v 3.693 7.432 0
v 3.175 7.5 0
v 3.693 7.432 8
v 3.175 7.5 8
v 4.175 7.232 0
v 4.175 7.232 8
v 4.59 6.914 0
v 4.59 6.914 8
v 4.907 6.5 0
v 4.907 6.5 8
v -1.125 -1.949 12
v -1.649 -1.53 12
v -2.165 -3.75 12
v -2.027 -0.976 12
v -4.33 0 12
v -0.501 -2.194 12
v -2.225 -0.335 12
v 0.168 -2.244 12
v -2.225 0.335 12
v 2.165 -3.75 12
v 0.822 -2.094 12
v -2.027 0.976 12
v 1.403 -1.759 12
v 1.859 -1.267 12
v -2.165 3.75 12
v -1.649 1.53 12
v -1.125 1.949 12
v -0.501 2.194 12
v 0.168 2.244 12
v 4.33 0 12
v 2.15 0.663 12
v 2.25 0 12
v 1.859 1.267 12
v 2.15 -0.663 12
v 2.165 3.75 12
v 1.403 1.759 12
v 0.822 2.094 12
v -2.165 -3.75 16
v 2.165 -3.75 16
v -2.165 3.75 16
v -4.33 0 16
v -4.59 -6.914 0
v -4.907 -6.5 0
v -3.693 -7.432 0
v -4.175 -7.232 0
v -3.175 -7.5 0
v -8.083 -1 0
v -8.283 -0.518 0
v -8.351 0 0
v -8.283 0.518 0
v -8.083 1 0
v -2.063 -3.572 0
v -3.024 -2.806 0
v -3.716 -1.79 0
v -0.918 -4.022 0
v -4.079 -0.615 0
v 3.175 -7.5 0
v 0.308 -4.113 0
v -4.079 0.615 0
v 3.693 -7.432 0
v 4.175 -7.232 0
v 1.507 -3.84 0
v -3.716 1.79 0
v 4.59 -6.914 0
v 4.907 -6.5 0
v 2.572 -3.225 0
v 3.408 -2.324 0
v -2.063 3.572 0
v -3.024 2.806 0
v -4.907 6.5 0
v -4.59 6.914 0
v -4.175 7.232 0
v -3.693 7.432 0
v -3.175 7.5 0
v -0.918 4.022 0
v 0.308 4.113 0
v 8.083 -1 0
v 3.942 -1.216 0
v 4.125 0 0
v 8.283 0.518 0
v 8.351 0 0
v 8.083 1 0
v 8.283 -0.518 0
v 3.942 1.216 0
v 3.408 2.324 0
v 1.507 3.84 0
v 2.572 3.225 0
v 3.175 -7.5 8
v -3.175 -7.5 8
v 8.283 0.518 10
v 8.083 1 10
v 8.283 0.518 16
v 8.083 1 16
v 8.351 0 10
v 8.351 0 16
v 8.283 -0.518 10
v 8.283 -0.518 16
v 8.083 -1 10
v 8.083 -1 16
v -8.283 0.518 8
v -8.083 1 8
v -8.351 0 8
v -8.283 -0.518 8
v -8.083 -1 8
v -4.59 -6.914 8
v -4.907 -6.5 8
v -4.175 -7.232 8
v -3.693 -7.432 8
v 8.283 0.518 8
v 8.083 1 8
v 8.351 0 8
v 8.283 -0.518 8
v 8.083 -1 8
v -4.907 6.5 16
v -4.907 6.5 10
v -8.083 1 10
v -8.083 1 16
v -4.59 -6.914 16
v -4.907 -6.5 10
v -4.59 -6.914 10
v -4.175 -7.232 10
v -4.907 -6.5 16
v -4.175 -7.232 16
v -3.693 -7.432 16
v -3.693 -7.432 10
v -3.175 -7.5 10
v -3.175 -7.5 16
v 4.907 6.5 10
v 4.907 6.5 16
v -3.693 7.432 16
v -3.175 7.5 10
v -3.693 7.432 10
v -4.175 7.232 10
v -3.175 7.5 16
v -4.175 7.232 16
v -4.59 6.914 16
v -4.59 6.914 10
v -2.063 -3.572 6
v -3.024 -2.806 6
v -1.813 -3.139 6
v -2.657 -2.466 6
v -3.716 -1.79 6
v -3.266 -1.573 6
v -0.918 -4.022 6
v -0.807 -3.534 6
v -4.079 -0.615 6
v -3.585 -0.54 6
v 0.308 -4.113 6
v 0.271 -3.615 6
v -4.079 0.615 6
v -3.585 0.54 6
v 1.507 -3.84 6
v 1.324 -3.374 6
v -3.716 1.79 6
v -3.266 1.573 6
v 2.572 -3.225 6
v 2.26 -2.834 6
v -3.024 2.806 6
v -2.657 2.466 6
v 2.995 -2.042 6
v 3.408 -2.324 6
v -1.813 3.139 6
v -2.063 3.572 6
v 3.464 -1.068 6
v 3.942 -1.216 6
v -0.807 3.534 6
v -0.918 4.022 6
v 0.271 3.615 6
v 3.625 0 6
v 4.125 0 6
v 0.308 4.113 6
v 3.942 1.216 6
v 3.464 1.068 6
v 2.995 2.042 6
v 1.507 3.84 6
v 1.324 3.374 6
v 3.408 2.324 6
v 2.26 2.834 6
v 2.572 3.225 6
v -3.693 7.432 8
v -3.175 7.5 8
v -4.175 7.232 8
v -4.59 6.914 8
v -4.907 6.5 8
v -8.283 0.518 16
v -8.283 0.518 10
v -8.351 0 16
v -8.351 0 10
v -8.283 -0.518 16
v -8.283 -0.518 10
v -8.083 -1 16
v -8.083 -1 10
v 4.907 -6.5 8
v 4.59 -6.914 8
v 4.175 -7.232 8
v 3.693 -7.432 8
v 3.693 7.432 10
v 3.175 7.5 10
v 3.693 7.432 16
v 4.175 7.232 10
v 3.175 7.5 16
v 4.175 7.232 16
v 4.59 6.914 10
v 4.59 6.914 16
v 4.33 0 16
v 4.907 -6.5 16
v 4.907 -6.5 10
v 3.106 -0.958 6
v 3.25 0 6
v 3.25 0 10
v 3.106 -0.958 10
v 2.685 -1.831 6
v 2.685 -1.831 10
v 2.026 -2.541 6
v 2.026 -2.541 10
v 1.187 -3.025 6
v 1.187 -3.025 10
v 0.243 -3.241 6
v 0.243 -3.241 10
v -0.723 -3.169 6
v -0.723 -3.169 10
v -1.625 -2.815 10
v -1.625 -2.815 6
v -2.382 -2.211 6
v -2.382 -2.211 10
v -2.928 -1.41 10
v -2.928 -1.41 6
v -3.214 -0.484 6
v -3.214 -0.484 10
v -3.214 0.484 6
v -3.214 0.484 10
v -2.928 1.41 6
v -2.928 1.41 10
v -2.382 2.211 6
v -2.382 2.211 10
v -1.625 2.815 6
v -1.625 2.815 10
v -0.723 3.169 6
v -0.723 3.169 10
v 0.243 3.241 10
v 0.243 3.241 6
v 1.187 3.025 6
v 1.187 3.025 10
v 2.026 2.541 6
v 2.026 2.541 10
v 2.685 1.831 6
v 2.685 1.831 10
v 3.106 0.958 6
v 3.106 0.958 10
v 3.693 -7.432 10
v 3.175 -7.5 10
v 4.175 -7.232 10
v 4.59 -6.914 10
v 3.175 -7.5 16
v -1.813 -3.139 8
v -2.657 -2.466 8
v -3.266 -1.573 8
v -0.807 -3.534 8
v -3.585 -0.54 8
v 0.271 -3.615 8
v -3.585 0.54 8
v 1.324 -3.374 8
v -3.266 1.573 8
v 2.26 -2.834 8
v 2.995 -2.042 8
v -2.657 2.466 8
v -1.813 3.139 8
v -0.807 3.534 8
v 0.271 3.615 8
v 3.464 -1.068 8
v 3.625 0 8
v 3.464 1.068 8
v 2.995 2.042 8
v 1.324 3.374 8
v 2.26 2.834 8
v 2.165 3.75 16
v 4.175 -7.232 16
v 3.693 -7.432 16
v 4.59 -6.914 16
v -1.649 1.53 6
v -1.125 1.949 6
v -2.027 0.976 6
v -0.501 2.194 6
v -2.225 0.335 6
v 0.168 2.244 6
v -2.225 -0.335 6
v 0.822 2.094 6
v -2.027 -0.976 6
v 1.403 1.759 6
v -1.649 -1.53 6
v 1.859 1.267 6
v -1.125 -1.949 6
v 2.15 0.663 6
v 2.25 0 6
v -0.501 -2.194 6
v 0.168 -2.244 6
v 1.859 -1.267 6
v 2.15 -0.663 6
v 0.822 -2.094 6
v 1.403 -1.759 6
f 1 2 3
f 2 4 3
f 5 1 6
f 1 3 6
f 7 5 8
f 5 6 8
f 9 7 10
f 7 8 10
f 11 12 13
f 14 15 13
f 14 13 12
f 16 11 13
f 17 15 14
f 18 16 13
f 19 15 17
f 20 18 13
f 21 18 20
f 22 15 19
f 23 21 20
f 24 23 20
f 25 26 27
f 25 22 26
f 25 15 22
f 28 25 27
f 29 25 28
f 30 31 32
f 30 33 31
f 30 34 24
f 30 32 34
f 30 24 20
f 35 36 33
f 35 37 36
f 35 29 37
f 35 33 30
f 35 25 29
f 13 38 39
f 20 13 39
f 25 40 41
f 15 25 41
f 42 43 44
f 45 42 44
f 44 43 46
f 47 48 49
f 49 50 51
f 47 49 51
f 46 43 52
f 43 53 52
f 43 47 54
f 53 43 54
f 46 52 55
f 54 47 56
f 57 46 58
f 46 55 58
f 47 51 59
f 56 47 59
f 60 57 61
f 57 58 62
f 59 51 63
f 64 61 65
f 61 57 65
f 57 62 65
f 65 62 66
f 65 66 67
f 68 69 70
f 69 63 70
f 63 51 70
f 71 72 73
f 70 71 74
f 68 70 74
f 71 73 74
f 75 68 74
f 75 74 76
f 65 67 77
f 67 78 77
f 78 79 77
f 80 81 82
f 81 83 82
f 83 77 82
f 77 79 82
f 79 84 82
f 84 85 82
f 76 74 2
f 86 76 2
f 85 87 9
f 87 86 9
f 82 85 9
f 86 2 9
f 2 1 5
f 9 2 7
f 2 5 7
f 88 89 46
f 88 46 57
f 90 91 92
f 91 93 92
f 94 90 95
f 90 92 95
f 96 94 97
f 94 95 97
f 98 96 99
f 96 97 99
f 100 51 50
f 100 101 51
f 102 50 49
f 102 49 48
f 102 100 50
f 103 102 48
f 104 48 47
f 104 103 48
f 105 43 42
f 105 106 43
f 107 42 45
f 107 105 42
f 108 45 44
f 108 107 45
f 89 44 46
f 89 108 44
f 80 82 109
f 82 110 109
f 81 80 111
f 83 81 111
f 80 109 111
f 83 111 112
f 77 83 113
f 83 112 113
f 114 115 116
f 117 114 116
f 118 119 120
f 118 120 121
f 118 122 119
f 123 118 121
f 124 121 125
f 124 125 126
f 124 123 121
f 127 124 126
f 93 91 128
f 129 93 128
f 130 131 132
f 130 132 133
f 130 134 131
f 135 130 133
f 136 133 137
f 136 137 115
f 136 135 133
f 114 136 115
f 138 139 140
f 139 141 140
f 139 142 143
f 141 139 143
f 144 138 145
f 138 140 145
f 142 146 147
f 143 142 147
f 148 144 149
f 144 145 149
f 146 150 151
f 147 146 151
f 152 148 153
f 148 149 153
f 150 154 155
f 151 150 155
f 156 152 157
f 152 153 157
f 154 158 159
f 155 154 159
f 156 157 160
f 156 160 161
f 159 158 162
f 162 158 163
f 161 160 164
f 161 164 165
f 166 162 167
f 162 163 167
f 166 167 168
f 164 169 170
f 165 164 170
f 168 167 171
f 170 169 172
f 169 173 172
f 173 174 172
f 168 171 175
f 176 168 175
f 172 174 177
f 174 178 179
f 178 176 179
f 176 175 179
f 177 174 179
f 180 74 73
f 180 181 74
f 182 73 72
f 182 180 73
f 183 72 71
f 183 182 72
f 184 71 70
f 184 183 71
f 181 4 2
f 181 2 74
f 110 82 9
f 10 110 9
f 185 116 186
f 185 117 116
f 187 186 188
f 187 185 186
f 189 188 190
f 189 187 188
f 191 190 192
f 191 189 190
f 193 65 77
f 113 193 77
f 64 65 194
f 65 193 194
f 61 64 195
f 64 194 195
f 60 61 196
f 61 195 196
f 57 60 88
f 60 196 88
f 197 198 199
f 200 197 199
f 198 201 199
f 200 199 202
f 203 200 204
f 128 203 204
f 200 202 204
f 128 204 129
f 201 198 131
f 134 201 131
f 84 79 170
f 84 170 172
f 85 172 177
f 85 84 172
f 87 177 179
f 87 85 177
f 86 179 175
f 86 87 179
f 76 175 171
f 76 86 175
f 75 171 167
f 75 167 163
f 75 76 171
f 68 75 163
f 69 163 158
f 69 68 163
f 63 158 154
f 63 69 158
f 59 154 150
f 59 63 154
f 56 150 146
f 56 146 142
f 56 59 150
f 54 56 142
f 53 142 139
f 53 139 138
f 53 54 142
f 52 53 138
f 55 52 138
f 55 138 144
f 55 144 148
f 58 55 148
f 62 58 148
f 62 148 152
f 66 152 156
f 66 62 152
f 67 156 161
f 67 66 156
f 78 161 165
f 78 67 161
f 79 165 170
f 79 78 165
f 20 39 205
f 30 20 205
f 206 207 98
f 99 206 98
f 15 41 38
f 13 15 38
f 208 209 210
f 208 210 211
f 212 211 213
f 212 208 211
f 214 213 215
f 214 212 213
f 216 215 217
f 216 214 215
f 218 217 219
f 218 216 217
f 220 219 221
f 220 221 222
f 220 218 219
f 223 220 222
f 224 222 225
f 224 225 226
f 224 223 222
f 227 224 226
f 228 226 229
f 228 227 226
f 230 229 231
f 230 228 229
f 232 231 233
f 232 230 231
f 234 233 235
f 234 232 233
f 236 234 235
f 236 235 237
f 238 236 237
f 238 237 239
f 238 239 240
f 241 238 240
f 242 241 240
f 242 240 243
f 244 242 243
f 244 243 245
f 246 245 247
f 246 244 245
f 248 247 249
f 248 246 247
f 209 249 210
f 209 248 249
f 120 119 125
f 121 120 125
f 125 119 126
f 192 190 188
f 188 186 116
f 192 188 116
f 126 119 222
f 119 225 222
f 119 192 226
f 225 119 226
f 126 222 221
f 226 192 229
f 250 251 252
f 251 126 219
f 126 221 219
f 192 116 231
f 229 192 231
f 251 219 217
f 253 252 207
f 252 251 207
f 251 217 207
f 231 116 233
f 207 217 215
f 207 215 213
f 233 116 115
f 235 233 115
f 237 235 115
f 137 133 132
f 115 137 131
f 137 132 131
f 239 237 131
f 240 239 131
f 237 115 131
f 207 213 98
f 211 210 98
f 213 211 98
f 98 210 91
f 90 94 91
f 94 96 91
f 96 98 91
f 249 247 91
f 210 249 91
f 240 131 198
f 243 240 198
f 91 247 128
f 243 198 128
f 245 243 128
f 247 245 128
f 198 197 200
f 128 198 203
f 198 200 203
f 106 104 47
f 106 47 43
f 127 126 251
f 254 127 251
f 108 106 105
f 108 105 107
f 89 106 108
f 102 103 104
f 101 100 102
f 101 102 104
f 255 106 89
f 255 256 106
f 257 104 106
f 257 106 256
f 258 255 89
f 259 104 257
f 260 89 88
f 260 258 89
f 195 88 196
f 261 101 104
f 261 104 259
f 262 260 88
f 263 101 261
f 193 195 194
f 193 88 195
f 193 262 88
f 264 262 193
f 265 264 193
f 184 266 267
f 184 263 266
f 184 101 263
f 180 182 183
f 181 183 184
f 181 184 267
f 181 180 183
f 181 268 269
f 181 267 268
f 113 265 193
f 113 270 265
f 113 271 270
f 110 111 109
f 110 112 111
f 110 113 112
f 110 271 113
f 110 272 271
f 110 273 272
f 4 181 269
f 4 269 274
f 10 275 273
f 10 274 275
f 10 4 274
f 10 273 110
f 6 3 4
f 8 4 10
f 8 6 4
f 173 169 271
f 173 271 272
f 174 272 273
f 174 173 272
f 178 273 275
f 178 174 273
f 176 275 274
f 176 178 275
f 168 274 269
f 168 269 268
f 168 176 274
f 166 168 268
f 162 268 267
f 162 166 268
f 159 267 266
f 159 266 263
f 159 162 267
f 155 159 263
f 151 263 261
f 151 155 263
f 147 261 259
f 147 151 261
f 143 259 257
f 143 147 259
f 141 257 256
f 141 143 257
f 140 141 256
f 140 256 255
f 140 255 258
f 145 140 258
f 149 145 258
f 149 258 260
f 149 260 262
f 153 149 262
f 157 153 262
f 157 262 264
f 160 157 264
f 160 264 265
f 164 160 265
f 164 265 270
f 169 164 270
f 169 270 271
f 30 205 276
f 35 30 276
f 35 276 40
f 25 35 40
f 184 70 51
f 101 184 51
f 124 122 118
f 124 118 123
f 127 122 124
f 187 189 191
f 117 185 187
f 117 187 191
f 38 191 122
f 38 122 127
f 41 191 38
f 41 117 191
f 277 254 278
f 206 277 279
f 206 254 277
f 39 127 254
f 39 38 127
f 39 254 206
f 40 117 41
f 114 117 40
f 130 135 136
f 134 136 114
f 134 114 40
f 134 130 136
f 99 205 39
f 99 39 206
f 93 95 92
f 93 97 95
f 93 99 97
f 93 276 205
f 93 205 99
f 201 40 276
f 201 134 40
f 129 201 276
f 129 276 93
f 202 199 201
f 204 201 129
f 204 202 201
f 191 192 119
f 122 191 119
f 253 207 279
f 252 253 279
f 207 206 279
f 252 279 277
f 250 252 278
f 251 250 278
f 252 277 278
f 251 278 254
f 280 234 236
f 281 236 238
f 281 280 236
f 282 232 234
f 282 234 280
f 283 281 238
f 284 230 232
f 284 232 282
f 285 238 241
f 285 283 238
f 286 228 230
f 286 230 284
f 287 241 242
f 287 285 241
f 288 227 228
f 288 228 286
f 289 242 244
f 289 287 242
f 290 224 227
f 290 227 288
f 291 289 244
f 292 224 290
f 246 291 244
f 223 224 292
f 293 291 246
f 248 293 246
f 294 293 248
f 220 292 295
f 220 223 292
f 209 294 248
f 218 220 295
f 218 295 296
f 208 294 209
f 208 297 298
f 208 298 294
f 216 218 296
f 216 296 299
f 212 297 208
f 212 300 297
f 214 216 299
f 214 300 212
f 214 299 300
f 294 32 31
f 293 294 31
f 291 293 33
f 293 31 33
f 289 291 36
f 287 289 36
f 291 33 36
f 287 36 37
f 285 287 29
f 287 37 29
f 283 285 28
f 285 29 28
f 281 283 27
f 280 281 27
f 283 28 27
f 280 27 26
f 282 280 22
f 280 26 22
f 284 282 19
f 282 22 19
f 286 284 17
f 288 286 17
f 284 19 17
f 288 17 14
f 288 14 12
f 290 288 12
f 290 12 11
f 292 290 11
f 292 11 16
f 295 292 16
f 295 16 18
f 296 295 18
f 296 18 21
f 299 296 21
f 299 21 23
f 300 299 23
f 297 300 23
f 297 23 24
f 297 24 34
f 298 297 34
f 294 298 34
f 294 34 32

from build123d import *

# Parameters (mm, degrees)
F0_R     = 4.125
F0_R_2   = 3.625
F1_DEPTH = 8
F2_DEPTH = 6
F3_R     = 3.25
F4_DEPTH = 4
F5_R     = 3.25
F6_DEPTH = 6
F7_R     = 2.25
F8_DEPTH = 16.001
F9_DEPTH = 4
F10_R    = 2
F10_2_R  = 2


with BuildPart() as f1:
    # F0 (on Top) → F1 (new body)
    with BuildSketch(Plane.XY):
        Polygon((4.3301270189, 7.5), (-4.3301270189, 7.5), (-8.6602540378, 0), (-4.3301270189, -7.5), (4.3301270189, -7.5), (8.6602540378, 0), align=None)
        Circle(F0_R, mode=Mode.SUBTRACT)
        Circle(F0_R)
        Circle(F0_R_2, mode=Mode.SUBTRACT)
    extrude(amount=F1_DEPTH)

    # F0 (on Top) → F2 (cut)
    with BuildSketch(Plane.XY):
        Circle(F0_R)
        Circle(F0_R_2, mode=Mode.SUBTRACT)
    extrude(amount=F2_DEPTH, mode=Mode.SUBTRACT)

    # F10
    f10_edges = [f1.edges().sort_by_distance(p)[0] for p in [
        (-8.660254, 0, 4),
        (-4.330127, 7.5, 4),
        (-4.330127, -7.5, 4),
        (4.330127, -7.5, 4),
        (8.660254, 0, 4),
        (4.330127, 7.5, 4),
    ]]
    fillet(f10_edges, radius=F10_R)


with BuildPart() as f4:
    # F3 (on face) → F4 (new body)
    with BuildSketch(Plane(origin=(0, 0, 6), x_dir=(1, 0, 0), z_dir=(0, 0, -1))):
        Circle(F3_R)
    extrude(amount=-F4_DEPTH)

    # F5 (on face) → F6 (join)
    with BuildSketch(Plane.XY.offset(10)):
        Polygon((4.3301270189, 7.5), (-4.3301270189, 7.5), (-8.6602540378, 0), (-4.3301270189, -7.5), (4.3301270189, -7.5), (8.6602540378, 0), align=None)
        Circle(F5_R, mode=Mode.SUBTRACT)
        Circle(F5_R)
    extrude(amount=F6_DEPTH)

    # F7 (on face) → F8 (cut, through all)
    with BuildSketch(Plane.XY.offset(16)):
        Circle(F7_R)
    extrude(amount=-F8_DEPTH, mode=Mode.SUBTRACT)

    # F7 (on face) → F9 (cut)
    with BuildSketch(Plane.XY.offset(16)):
        Polygon((2.1650635095, 3.75), (-2.1650635095, 3.75), (-4.3301270189, 0), (-2.1650635095, -3.75), (2.1650635095, -3.75), (4.3301270189, 0), align=None)
        Circle(F7_R, mode=Mode.SUBTRACT)
    extrude(amount=-F9_DEPTH, mode=Mode.SUBTRACT)

    # F10#2
    f10_2_edges = [f4.edges().sort_by_distance(p)[0] for p in [
        (-8.660254, 0, 13),
        (-4.330127, 7.5, 13),
        (-4.330127, -7.5, 13),
        (4.330127, 7.5, 13),
        (8.660254, 0, 13),
        (4.330127, -7.5, 13),
    ]]
    fillet(f10_2_edges, radius=F10_2_R)


solid = Compound([f1.part, f4.part])
